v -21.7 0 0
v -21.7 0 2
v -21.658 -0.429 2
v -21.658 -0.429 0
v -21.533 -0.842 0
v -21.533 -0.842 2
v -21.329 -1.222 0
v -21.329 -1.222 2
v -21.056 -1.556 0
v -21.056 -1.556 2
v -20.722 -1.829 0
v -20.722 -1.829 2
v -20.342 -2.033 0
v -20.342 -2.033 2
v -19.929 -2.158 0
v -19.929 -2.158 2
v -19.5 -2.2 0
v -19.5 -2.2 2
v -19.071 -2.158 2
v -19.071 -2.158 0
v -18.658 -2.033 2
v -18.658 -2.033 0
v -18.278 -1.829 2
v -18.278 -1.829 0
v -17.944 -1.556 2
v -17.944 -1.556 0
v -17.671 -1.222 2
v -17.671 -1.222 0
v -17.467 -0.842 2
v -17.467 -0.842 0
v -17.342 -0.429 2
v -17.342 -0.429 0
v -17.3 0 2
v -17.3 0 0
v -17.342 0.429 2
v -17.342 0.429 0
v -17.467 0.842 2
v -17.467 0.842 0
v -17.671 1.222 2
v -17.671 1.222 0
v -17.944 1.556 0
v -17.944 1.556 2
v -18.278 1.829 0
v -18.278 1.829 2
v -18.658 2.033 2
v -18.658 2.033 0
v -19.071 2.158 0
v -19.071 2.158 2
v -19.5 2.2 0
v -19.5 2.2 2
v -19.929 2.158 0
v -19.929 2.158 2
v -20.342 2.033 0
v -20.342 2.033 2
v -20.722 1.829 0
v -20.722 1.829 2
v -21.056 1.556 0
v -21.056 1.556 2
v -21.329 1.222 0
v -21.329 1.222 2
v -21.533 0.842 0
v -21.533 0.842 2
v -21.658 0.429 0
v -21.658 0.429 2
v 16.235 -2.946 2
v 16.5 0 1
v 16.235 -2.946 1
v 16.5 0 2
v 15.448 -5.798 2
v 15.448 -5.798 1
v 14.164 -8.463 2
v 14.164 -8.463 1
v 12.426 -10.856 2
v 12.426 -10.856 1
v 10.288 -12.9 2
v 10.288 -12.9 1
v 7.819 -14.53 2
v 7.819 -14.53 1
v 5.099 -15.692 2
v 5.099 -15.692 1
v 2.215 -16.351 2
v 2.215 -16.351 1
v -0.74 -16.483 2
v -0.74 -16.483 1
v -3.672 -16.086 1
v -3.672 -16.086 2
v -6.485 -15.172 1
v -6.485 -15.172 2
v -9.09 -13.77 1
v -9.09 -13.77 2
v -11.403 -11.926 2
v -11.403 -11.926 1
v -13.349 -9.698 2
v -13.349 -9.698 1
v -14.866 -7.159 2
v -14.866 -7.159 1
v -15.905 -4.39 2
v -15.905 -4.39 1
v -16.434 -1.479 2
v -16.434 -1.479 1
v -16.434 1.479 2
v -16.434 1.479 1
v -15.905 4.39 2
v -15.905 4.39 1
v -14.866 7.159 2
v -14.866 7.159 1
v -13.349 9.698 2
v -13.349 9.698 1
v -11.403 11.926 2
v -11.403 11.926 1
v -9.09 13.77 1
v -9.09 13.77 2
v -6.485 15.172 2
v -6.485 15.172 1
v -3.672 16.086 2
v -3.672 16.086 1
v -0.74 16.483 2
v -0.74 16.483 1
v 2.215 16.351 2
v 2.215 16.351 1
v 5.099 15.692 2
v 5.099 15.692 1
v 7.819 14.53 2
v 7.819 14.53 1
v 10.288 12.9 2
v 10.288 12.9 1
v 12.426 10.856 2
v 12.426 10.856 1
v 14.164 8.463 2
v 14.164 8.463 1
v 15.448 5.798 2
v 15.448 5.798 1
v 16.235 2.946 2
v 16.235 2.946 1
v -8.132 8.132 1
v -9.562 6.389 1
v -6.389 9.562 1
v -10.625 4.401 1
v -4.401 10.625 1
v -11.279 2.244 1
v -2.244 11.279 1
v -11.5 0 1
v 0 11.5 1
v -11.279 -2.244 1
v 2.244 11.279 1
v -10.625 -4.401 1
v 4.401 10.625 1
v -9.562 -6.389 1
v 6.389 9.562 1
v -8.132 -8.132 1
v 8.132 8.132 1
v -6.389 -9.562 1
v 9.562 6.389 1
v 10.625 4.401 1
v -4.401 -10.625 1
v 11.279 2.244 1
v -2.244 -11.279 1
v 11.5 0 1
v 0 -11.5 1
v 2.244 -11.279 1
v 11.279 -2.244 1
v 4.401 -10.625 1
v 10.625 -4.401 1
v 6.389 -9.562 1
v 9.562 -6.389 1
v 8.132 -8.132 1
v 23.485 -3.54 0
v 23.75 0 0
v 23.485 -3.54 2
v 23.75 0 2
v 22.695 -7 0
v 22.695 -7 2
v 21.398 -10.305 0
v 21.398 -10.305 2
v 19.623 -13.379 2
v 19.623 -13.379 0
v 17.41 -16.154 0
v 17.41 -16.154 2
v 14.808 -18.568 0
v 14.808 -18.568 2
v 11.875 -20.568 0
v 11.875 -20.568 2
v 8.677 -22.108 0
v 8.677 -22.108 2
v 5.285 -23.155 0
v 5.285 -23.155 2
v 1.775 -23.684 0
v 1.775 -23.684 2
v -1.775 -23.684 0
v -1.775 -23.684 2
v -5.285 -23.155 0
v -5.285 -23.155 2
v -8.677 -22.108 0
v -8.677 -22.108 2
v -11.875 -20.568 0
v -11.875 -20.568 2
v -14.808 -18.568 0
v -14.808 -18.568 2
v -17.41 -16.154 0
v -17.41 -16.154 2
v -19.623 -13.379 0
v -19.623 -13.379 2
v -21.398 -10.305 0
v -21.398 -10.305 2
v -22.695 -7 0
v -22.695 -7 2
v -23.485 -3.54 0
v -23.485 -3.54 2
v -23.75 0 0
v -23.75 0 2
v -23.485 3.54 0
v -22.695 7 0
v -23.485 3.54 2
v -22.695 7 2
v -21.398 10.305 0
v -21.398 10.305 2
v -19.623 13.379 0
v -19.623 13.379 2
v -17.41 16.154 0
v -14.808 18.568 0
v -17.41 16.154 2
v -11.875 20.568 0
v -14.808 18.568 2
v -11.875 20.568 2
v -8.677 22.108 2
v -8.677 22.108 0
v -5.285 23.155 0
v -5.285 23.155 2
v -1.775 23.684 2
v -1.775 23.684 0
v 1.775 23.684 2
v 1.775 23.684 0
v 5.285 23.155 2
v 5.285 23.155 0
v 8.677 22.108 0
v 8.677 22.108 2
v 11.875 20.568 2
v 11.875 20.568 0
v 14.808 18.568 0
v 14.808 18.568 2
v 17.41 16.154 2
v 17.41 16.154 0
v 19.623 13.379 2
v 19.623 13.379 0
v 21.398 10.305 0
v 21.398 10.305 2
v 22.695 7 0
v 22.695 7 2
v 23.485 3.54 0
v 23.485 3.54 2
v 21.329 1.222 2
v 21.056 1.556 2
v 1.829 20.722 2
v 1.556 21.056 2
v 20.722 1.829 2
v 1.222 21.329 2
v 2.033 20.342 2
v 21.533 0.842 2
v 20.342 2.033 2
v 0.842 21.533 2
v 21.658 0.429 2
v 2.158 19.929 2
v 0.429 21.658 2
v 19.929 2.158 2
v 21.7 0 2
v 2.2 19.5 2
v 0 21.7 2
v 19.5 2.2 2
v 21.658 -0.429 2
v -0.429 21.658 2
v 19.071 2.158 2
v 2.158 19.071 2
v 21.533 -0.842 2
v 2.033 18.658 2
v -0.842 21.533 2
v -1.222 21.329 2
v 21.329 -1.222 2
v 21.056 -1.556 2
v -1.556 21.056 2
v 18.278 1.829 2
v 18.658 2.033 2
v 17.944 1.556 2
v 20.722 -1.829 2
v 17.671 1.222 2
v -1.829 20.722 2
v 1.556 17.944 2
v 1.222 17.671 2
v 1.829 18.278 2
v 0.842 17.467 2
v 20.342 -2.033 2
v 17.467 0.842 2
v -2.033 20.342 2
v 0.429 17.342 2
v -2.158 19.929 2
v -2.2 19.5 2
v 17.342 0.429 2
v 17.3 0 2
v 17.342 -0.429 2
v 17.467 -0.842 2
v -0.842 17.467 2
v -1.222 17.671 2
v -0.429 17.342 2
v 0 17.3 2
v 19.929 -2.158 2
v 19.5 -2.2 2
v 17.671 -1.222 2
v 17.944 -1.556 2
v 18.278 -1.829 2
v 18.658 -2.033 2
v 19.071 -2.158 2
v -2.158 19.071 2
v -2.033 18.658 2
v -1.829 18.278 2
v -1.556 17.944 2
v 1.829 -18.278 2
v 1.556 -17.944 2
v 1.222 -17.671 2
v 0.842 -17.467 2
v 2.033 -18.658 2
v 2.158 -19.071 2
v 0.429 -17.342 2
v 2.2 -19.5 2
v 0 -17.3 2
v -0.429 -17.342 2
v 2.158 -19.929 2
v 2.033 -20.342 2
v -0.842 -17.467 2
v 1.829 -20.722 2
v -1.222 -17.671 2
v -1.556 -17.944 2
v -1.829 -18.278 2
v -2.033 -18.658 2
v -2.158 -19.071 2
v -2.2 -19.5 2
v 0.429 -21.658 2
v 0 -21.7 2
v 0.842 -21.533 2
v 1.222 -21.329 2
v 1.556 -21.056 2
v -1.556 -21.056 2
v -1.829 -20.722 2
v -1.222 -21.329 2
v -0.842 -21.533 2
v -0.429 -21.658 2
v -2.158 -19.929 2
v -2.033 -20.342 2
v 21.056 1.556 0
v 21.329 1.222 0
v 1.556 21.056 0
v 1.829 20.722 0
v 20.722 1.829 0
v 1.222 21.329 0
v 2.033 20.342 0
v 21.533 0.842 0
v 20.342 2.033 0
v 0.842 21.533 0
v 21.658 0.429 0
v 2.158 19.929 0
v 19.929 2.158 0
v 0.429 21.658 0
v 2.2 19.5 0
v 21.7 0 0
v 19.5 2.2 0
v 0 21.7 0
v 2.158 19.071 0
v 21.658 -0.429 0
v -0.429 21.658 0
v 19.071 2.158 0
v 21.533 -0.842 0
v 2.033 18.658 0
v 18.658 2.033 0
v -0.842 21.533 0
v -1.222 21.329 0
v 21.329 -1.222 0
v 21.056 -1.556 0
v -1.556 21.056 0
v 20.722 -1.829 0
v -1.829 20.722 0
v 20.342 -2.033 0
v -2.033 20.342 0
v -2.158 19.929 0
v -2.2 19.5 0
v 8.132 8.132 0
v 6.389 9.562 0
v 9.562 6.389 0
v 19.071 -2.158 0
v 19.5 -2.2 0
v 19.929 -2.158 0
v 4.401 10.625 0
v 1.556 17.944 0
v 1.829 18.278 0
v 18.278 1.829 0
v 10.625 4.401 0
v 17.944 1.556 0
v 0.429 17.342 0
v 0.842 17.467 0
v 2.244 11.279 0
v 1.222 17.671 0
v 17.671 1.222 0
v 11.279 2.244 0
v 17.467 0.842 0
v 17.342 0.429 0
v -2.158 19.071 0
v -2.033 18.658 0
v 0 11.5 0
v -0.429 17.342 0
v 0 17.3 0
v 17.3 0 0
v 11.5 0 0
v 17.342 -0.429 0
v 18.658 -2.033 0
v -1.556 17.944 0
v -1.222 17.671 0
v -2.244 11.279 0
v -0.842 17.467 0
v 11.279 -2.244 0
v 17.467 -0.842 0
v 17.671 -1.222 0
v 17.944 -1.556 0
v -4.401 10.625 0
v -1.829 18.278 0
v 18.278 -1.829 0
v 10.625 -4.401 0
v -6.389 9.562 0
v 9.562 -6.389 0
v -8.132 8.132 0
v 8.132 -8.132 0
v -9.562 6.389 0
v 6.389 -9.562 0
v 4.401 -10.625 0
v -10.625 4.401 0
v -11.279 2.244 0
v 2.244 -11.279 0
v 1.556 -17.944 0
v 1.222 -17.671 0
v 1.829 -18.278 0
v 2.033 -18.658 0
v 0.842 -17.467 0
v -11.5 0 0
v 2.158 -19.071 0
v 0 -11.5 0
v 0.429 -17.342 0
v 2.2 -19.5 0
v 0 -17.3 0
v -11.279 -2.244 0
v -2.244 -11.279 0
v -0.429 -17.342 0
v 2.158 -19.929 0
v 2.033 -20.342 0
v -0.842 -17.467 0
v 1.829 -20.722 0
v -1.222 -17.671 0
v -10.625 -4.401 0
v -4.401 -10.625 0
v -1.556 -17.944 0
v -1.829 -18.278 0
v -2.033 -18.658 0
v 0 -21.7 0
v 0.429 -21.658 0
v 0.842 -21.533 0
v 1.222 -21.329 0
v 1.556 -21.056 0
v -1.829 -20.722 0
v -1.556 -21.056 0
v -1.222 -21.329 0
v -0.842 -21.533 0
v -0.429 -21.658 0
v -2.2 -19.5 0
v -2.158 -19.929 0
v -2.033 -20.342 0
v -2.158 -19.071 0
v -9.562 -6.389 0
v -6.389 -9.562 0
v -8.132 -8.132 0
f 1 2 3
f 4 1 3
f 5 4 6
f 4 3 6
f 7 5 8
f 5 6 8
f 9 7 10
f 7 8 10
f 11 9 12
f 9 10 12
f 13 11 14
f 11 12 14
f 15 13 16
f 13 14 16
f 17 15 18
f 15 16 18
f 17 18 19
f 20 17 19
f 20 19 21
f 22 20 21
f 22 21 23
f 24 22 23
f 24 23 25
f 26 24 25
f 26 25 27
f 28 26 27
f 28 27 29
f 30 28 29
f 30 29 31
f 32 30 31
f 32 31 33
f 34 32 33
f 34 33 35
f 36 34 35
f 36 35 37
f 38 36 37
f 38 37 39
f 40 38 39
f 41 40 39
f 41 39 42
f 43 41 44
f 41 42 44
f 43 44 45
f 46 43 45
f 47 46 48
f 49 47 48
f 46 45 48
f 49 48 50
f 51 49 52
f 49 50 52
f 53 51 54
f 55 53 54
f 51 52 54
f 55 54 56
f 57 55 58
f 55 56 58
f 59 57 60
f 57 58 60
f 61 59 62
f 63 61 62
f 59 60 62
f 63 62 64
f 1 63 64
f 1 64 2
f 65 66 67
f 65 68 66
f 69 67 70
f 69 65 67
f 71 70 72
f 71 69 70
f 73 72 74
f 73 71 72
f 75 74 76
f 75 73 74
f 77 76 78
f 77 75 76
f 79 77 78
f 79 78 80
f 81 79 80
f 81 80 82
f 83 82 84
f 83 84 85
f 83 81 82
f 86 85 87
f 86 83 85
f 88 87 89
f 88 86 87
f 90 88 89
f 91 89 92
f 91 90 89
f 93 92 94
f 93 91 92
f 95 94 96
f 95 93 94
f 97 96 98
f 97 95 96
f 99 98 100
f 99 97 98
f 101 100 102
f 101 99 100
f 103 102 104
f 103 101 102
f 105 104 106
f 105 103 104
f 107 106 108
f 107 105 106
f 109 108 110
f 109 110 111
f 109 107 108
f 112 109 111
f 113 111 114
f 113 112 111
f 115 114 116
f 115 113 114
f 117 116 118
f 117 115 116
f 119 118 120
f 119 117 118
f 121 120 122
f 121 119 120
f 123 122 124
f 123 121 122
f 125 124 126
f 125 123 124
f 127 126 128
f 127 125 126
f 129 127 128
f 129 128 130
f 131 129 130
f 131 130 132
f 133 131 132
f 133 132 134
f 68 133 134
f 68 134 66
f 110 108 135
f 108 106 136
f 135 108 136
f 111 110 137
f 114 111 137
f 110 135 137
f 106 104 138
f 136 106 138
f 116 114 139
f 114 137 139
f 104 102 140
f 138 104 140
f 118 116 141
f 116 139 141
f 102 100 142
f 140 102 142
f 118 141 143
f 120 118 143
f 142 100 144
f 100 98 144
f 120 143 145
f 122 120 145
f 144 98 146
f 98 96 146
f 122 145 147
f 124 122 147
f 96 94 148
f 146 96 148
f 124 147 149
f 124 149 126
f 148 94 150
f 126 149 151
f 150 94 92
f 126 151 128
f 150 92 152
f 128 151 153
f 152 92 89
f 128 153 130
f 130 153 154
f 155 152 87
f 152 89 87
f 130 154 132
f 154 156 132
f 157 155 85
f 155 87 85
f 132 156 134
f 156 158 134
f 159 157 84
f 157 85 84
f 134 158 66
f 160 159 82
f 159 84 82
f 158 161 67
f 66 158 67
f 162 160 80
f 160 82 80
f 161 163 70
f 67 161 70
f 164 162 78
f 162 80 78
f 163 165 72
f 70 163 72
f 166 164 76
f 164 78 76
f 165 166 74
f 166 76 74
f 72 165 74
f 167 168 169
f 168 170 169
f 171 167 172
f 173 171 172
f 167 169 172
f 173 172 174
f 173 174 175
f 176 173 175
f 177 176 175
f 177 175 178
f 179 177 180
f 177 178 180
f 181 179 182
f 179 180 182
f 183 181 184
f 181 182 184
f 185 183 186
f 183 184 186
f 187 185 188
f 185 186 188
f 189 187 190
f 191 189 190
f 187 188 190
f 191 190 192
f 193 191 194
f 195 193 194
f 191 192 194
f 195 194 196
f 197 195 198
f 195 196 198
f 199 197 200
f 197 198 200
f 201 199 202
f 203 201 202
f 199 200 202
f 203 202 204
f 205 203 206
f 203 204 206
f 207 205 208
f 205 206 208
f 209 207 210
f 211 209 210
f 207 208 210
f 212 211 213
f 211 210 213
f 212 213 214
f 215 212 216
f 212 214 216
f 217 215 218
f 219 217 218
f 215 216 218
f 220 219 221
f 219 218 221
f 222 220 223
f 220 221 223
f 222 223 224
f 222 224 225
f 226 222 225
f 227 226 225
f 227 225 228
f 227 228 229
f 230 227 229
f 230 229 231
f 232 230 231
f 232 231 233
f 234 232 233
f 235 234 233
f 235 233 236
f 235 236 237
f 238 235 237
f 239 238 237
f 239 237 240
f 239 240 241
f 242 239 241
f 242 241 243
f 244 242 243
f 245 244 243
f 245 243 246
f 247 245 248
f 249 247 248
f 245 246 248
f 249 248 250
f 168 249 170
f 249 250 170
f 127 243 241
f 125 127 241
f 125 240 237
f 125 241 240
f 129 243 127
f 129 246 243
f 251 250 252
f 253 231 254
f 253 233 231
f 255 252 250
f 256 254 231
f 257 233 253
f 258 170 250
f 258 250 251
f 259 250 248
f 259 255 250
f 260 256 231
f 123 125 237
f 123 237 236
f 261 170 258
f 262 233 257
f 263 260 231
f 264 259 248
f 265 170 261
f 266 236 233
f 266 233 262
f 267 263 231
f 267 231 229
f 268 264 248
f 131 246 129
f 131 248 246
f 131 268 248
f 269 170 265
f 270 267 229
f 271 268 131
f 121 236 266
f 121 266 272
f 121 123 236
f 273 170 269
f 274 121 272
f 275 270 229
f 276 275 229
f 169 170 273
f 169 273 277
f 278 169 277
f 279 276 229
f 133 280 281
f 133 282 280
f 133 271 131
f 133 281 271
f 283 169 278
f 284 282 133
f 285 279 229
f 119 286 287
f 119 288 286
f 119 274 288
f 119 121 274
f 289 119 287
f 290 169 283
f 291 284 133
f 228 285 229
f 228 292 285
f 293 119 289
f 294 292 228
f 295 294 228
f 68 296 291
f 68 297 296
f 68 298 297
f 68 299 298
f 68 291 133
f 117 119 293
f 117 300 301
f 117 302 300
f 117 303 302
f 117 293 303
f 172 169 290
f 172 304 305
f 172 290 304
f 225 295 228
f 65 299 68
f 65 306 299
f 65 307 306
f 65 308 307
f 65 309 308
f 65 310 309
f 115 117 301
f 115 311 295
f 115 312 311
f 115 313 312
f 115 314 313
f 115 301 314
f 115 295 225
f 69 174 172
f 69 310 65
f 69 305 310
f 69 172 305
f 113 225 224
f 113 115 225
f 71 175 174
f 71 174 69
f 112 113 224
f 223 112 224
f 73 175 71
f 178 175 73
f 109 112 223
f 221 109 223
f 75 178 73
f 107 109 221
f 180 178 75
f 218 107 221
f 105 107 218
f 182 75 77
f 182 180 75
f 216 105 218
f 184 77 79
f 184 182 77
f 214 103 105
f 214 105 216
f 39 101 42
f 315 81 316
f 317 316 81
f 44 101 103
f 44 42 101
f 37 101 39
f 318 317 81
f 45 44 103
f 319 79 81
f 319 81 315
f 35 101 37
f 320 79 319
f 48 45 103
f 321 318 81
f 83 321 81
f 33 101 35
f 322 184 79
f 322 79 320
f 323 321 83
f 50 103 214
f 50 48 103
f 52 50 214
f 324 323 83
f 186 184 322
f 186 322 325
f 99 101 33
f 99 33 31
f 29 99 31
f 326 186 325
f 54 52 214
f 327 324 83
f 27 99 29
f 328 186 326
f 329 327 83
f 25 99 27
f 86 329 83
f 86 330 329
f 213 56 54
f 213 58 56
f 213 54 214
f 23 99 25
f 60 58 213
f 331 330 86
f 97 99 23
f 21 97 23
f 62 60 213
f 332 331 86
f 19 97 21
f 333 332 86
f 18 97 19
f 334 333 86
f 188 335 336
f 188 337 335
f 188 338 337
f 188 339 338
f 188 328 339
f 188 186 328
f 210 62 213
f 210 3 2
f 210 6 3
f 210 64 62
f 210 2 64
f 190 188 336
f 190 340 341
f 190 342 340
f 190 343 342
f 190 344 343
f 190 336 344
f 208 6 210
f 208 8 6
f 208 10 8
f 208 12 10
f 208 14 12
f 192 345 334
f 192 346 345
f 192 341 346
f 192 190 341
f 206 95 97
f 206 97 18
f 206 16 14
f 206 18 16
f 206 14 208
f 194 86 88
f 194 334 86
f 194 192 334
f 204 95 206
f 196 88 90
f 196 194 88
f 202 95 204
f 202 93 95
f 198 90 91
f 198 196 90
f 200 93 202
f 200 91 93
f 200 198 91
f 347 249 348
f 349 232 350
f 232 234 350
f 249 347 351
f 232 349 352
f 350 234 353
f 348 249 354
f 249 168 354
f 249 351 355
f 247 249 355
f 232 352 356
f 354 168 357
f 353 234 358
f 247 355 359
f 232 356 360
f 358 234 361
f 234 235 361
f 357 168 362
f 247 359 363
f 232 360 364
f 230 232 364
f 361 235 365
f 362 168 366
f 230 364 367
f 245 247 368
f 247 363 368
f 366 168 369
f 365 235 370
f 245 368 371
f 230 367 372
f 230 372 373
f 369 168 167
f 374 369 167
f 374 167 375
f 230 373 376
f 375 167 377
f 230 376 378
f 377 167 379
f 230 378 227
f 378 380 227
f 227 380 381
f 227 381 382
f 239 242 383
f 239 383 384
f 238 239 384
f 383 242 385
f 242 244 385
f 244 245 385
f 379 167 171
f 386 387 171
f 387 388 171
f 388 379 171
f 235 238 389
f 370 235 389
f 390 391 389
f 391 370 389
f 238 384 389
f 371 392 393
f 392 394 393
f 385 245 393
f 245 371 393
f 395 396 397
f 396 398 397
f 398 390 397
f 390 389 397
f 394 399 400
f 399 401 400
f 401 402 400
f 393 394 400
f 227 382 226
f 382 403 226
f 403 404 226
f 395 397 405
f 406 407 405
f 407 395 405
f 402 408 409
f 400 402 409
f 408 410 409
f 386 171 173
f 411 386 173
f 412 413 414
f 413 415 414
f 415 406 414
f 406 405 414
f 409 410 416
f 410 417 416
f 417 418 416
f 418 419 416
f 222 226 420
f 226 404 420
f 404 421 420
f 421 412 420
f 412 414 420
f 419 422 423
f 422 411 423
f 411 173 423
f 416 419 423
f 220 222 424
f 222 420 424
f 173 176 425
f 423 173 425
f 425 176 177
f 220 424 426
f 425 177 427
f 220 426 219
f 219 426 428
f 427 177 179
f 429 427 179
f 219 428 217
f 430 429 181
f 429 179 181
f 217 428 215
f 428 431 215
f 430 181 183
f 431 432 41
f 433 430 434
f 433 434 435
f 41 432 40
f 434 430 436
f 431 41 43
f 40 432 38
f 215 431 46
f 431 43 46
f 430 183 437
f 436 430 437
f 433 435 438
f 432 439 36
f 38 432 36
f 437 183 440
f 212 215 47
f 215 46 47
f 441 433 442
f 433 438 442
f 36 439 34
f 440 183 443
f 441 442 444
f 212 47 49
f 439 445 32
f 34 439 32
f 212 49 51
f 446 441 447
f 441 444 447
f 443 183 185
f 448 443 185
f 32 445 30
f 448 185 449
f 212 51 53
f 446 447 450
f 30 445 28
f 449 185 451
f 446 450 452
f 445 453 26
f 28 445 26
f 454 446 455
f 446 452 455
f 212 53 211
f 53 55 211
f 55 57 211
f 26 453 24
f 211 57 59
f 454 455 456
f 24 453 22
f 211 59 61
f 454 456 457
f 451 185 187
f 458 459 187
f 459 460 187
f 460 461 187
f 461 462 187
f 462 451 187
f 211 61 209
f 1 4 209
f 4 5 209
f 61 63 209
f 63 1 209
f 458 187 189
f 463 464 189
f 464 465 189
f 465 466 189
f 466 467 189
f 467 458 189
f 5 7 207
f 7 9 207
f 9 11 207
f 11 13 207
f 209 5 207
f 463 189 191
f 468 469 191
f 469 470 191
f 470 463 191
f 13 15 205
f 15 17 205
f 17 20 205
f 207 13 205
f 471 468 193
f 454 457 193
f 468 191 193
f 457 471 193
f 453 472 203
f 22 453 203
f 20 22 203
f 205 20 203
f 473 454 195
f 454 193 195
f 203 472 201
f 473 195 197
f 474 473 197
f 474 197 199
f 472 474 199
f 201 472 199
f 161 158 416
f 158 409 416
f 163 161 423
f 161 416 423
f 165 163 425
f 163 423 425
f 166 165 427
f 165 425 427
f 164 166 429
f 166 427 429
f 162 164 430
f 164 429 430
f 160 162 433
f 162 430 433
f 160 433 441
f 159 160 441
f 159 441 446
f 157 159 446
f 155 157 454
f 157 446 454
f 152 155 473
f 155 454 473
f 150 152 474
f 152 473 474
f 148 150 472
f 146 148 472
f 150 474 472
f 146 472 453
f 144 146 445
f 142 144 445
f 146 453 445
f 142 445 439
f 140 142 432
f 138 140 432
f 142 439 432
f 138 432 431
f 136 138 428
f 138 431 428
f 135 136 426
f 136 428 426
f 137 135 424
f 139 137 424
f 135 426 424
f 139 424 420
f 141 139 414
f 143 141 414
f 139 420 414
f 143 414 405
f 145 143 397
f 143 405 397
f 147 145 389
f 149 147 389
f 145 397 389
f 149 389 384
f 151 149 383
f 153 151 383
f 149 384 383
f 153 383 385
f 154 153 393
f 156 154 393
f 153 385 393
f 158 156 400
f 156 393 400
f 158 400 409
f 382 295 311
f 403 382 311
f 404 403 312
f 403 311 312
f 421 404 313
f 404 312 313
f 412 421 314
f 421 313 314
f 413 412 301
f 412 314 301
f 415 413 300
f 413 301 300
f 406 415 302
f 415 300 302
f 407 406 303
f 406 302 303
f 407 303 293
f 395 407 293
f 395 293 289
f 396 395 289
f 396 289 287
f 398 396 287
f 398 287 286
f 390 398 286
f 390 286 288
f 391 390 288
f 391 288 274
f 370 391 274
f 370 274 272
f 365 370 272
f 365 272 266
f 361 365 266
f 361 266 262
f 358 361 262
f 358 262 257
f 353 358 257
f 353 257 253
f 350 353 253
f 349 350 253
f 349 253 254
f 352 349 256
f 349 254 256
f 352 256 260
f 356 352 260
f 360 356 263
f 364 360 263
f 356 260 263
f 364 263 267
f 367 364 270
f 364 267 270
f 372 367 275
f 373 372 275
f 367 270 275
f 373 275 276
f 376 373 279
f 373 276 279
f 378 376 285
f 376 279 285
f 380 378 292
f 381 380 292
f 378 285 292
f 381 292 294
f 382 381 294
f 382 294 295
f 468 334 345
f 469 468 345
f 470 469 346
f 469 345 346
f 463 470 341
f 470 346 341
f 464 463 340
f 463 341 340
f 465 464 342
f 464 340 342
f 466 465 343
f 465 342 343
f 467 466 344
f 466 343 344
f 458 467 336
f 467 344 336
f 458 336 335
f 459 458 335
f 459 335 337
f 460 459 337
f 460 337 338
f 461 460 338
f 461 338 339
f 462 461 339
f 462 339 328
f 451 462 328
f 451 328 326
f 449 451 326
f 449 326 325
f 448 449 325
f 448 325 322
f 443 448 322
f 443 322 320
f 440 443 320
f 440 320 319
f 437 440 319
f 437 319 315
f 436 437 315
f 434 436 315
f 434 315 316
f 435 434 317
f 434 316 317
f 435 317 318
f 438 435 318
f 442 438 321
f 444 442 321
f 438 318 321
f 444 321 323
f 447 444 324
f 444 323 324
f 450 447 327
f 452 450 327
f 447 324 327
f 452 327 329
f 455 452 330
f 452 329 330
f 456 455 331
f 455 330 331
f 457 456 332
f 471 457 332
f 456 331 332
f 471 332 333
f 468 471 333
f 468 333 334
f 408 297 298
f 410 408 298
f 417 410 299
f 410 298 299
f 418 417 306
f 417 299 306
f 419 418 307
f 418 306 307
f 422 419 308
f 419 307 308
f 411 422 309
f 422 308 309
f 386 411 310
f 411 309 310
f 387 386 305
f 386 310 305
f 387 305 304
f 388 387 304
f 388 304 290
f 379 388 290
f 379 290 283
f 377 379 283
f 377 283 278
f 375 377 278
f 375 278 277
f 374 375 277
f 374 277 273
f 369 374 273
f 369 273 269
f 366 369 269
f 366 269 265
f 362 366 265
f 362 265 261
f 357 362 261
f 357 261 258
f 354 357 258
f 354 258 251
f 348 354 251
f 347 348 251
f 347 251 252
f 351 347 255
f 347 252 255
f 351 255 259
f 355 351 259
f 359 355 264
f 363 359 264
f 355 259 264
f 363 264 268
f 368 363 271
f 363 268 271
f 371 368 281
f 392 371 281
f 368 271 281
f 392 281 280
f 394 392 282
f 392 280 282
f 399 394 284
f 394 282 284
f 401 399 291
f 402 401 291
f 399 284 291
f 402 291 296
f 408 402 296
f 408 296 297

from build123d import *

# Parameters (mm, degrees)
F1_W = 7.25
F1_H = 1
F4_D = 4.4
F5_D = 4.4
F6_D = 4.4
F7_D = 4.4


with BuildPart() as f2:
    # F1 (on Front) → F2 (revolve)
    with BuildSketch(Plane.XZ):
        Polygon((11.5, 1), (11.5, 0), (23.75, 0), (23.75, 1), (16.5, 1), align=None)
        with Locations((20.125, 1.5)):
            Rectangle(F1_W, F1_H)
    revolve(axis=Axis((0, 0, 1.627581194), (0, 0, -1)))

    # F4 (through all)
    with Locations(Plane(origin=(0, 0, 0), x_dir=(1, 0, 0), z_dir=(0, 0, -1))):
        with Locations((19.5, 0)):
            Hole(F4_D / 2)

    # F5 (through all)
    with Locations(Plane(origin=(0, 0, 0), x_dir=(1, 0, 0), z_dir=(0, 0, -1))):
        with Locations((0, 19.5)):
            Hole(F5_D / 2)

    # F6 (through all)
    with Locations(Plane(origin=(0, 0, 0), x_dir=(1, 0, 0), z_dir=(0, 0, -1))):
        with Locations((-19.5, 0)):
            Hole(F6_D / 2)

    # F7 (through all)
    with Locations(Plane(origin=(0, 0, 0), x_dir=(1, 0, 0), z_dir=(0, 0, -1))):
        with Locations((0, -19.5)):
            Hole(F7_D / 2)


solid = f2.part
